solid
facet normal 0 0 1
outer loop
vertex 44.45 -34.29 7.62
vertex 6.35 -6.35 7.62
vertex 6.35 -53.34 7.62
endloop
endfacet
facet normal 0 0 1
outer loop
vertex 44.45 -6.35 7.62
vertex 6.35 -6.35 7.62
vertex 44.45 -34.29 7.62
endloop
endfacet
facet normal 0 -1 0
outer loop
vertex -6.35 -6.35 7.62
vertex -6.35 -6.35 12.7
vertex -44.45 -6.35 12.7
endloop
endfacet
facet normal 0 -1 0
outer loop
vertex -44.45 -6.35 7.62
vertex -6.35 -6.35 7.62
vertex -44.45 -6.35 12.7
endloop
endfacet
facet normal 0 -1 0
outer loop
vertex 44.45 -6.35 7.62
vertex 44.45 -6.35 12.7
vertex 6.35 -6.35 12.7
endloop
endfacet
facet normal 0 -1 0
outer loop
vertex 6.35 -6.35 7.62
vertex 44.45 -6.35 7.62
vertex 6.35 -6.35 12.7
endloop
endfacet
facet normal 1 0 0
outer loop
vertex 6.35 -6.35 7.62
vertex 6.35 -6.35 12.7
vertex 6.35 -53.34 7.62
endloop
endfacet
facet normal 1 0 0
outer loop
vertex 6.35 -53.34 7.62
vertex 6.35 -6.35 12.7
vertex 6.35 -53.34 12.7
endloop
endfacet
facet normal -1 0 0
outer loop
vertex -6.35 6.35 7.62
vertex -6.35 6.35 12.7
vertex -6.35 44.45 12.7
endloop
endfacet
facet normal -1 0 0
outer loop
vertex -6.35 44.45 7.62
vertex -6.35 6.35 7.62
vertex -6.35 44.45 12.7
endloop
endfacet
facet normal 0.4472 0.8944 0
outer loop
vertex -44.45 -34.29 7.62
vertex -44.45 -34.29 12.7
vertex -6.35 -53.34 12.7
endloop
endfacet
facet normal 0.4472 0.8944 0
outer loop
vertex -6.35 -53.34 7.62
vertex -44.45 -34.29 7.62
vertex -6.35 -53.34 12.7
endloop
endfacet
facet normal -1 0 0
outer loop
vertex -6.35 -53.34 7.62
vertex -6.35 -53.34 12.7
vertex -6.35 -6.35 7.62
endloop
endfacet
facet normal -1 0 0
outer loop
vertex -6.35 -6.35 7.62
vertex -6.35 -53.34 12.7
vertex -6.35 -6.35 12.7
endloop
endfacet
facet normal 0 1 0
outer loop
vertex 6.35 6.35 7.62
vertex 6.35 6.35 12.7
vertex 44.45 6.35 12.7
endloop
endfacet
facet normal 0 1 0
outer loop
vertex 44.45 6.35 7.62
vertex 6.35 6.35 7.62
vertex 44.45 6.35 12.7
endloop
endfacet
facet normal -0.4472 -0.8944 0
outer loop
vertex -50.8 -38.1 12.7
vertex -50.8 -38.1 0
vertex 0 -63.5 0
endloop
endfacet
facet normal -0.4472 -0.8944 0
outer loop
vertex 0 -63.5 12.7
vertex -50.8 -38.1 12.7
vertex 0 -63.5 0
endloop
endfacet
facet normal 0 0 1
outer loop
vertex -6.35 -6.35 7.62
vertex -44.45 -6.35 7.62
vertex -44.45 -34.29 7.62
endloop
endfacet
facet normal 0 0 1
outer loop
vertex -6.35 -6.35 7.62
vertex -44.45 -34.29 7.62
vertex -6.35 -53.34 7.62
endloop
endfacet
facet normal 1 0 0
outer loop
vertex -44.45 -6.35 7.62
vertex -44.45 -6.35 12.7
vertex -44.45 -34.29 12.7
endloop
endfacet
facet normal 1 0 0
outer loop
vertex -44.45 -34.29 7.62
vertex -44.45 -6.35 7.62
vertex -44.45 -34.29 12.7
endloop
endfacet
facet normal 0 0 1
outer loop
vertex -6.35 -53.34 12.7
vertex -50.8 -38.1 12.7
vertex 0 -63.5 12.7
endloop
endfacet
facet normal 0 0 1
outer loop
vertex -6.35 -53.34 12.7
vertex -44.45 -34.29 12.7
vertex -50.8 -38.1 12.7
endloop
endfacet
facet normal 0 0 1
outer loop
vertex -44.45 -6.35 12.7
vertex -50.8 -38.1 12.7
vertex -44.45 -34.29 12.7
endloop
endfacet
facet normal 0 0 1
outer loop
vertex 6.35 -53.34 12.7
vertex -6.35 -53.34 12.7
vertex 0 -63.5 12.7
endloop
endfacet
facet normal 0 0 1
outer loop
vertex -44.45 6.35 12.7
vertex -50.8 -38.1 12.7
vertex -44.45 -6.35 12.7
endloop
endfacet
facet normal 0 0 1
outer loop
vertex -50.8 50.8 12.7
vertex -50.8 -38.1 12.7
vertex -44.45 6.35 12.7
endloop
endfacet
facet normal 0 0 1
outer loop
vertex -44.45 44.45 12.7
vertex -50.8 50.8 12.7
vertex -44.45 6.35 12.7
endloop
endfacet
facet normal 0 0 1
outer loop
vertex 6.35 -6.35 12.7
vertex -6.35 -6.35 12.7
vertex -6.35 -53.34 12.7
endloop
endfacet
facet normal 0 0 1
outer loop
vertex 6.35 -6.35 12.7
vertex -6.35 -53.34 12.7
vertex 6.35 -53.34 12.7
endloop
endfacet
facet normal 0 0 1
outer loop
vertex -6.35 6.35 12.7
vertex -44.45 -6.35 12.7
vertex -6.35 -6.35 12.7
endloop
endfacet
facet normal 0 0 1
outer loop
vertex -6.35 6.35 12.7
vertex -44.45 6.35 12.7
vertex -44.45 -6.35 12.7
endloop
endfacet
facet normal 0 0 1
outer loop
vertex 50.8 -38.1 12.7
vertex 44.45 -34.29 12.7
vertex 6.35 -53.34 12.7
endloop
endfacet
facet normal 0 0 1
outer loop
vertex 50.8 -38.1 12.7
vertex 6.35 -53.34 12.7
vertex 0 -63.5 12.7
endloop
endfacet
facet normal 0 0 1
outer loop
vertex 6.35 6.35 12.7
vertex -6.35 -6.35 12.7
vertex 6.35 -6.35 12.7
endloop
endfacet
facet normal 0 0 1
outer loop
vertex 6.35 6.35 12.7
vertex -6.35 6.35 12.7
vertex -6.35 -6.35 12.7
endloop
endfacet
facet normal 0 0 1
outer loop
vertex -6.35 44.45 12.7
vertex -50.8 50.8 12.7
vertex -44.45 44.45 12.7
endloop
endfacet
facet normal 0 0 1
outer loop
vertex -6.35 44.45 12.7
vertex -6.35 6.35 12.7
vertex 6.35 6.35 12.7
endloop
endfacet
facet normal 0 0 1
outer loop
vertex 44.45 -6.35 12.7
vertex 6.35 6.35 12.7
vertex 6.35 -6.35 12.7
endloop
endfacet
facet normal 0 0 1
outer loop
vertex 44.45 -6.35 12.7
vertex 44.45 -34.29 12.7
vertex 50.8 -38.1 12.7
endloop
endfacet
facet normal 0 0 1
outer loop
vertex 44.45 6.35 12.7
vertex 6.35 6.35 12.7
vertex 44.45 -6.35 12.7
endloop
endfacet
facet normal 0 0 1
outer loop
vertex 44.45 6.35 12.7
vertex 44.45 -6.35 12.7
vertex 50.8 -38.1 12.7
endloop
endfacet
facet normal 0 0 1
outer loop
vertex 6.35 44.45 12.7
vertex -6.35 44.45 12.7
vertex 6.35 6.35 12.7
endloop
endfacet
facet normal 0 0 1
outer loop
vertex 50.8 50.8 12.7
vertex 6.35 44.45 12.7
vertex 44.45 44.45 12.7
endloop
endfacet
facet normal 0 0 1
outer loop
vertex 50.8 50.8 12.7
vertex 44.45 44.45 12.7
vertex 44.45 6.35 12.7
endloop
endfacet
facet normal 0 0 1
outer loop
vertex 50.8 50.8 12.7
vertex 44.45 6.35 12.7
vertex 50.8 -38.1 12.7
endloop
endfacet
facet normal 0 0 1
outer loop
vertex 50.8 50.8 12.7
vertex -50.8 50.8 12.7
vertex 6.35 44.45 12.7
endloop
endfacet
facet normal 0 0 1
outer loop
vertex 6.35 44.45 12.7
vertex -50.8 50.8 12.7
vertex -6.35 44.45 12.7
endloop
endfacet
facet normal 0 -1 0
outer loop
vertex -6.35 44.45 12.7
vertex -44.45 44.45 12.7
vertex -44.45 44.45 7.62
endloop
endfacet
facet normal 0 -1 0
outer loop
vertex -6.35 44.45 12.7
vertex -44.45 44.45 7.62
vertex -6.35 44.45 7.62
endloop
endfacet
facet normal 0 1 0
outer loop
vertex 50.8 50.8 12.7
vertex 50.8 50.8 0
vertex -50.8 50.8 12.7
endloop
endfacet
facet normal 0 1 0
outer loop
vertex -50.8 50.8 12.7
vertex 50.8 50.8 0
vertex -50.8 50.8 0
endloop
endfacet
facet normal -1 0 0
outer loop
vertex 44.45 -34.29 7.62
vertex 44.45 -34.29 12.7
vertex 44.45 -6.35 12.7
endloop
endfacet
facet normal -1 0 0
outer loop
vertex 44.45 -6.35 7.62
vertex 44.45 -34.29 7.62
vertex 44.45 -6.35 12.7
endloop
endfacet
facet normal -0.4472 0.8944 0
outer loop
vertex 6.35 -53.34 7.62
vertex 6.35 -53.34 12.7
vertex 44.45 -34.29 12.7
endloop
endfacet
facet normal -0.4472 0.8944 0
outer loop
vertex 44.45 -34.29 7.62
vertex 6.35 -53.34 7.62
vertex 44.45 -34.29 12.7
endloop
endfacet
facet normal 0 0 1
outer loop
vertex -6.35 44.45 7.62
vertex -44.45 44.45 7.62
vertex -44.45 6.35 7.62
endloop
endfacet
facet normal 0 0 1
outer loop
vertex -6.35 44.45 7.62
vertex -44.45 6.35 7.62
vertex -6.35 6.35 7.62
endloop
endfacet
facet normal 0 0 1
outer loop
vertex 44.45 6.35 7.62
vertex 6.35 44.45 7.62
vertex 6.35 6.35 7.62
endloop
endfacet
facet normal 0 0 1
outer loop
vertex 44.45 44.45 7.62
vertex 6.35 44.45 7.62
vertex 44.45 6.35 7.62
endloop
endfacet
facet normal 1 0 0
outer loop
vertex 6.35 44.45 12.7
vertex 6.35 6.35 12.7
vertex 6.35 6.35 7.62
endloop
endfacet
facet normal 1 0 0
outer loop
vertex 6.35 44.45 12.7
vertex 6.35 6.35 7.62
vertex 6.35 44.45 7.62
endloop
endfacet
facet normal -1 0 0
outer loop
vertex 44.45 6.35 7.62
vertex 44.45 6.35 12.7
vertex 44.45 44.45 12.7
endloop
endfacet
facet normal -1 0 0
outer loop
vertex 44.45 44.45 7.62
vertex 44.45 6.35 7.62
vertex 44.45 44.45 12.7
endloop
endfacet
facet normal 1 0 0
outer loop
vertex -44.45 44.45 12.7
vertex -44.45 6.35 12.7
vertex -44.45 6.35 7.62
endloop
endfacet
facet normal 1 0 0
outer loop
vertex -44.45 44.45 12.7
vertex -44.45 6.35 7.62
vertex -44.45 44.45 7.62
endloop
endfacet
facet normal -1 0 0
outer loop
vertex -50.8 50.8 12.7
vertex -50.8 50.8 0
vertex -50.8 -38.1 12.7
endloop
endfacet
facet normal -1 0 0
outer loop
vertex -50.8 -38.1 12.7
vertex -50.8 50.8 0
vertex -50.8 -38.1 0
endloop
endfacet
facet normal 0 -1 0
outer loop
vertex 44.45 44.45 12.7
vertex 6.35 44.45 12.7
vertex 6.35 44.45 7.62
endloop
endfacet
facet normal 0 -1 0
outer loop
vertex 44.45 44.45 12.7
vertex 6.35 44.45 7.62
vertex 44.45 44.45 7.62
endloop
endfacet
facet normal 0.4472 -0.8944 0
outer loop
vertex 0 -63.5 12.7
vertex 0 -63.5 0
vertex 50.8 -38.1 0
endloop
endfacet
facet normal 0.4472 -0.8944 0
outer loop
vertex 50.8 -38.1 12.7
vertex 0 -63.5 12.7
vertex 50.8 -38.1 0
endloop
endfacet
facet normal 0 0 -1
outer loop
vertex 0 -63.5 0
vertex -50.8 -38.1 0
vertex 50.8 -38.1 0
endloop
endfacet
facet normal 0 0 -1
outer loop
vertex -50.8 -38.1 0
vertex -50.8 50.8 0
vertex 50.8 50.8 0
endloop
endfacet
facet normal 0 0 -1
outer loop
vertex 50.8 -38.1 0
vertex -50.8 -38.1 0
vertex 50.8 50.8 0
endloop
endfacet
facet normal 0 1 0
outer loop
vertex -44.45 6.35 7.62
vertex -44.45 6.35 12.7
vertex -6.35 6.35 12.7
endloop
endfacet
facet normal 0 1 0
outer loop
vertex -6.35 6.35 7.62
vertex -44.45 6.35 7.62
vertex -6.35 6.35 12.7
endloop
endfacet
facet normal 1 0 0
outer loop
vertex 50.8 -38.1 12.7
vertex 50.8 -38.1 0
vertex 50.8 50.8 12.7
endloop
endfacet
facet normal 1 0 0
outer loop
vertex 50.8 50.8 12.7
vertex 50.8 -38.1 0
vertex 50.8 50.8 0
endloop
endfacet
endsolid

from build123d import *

# Parameters (mm, degrees)
F0_W     = 50.8
F0_H     = 50.8
F1_DEPTH = 12.7
F2_W     = 38.1
F2_H     = 38.1
F4_DEPTH = 5.08
F5_DEPTH = 5.08


with BuildPart() as f1:
    # F0 (on Top) → F1 (new body)
    with BuildSketch(Plane.XY):
        with Locations((-25.4, 25.4)):
            Rectangle(F0_W, F0_H)
        with Locations((25.4, 25.4)):
            Rectangle(F0_W, F0_H)
        Polygon((50.8, 0), (0, 0), (0, -63.5), (50.8, -38.1), align=None)
        Polygon((0, -63.5), (0, 0), (-50.8, 0), (-50.8, -38.1), align=None)
    extrude(amount=F1_DEPTH)

    # F2 (on face) → F4 (cut)
    with BuildSketch(Plane.XY.offset(12.7)):
        with Locations((-25.4, 25.4)):
            Rectangle(F2_W, F2_H)
        with Locations((25.4, 25.4)):
            Rectangle(F2_W, F2_H)
    extrude(amount=-F4_DEPTH, mode=Mode.SUBTRACT)

    # F3 (on face) → F5 (cut)
    with BuildSketch(Plane.XY.offset(12.7)):
        Polygon((-6.35, -6.35), (-44.45, -6.35), (-44.45, -34.29), (-6.35, -53.34), align=None)
        Polygon((6.35, -6.35), (6.35, -53.34), (44.45, -34.29), (44.45, -6.35), align=None)
    extrude(amount=-F5_DEPTH, mode=Mode.SUBTRACT)


solid = f1.part
